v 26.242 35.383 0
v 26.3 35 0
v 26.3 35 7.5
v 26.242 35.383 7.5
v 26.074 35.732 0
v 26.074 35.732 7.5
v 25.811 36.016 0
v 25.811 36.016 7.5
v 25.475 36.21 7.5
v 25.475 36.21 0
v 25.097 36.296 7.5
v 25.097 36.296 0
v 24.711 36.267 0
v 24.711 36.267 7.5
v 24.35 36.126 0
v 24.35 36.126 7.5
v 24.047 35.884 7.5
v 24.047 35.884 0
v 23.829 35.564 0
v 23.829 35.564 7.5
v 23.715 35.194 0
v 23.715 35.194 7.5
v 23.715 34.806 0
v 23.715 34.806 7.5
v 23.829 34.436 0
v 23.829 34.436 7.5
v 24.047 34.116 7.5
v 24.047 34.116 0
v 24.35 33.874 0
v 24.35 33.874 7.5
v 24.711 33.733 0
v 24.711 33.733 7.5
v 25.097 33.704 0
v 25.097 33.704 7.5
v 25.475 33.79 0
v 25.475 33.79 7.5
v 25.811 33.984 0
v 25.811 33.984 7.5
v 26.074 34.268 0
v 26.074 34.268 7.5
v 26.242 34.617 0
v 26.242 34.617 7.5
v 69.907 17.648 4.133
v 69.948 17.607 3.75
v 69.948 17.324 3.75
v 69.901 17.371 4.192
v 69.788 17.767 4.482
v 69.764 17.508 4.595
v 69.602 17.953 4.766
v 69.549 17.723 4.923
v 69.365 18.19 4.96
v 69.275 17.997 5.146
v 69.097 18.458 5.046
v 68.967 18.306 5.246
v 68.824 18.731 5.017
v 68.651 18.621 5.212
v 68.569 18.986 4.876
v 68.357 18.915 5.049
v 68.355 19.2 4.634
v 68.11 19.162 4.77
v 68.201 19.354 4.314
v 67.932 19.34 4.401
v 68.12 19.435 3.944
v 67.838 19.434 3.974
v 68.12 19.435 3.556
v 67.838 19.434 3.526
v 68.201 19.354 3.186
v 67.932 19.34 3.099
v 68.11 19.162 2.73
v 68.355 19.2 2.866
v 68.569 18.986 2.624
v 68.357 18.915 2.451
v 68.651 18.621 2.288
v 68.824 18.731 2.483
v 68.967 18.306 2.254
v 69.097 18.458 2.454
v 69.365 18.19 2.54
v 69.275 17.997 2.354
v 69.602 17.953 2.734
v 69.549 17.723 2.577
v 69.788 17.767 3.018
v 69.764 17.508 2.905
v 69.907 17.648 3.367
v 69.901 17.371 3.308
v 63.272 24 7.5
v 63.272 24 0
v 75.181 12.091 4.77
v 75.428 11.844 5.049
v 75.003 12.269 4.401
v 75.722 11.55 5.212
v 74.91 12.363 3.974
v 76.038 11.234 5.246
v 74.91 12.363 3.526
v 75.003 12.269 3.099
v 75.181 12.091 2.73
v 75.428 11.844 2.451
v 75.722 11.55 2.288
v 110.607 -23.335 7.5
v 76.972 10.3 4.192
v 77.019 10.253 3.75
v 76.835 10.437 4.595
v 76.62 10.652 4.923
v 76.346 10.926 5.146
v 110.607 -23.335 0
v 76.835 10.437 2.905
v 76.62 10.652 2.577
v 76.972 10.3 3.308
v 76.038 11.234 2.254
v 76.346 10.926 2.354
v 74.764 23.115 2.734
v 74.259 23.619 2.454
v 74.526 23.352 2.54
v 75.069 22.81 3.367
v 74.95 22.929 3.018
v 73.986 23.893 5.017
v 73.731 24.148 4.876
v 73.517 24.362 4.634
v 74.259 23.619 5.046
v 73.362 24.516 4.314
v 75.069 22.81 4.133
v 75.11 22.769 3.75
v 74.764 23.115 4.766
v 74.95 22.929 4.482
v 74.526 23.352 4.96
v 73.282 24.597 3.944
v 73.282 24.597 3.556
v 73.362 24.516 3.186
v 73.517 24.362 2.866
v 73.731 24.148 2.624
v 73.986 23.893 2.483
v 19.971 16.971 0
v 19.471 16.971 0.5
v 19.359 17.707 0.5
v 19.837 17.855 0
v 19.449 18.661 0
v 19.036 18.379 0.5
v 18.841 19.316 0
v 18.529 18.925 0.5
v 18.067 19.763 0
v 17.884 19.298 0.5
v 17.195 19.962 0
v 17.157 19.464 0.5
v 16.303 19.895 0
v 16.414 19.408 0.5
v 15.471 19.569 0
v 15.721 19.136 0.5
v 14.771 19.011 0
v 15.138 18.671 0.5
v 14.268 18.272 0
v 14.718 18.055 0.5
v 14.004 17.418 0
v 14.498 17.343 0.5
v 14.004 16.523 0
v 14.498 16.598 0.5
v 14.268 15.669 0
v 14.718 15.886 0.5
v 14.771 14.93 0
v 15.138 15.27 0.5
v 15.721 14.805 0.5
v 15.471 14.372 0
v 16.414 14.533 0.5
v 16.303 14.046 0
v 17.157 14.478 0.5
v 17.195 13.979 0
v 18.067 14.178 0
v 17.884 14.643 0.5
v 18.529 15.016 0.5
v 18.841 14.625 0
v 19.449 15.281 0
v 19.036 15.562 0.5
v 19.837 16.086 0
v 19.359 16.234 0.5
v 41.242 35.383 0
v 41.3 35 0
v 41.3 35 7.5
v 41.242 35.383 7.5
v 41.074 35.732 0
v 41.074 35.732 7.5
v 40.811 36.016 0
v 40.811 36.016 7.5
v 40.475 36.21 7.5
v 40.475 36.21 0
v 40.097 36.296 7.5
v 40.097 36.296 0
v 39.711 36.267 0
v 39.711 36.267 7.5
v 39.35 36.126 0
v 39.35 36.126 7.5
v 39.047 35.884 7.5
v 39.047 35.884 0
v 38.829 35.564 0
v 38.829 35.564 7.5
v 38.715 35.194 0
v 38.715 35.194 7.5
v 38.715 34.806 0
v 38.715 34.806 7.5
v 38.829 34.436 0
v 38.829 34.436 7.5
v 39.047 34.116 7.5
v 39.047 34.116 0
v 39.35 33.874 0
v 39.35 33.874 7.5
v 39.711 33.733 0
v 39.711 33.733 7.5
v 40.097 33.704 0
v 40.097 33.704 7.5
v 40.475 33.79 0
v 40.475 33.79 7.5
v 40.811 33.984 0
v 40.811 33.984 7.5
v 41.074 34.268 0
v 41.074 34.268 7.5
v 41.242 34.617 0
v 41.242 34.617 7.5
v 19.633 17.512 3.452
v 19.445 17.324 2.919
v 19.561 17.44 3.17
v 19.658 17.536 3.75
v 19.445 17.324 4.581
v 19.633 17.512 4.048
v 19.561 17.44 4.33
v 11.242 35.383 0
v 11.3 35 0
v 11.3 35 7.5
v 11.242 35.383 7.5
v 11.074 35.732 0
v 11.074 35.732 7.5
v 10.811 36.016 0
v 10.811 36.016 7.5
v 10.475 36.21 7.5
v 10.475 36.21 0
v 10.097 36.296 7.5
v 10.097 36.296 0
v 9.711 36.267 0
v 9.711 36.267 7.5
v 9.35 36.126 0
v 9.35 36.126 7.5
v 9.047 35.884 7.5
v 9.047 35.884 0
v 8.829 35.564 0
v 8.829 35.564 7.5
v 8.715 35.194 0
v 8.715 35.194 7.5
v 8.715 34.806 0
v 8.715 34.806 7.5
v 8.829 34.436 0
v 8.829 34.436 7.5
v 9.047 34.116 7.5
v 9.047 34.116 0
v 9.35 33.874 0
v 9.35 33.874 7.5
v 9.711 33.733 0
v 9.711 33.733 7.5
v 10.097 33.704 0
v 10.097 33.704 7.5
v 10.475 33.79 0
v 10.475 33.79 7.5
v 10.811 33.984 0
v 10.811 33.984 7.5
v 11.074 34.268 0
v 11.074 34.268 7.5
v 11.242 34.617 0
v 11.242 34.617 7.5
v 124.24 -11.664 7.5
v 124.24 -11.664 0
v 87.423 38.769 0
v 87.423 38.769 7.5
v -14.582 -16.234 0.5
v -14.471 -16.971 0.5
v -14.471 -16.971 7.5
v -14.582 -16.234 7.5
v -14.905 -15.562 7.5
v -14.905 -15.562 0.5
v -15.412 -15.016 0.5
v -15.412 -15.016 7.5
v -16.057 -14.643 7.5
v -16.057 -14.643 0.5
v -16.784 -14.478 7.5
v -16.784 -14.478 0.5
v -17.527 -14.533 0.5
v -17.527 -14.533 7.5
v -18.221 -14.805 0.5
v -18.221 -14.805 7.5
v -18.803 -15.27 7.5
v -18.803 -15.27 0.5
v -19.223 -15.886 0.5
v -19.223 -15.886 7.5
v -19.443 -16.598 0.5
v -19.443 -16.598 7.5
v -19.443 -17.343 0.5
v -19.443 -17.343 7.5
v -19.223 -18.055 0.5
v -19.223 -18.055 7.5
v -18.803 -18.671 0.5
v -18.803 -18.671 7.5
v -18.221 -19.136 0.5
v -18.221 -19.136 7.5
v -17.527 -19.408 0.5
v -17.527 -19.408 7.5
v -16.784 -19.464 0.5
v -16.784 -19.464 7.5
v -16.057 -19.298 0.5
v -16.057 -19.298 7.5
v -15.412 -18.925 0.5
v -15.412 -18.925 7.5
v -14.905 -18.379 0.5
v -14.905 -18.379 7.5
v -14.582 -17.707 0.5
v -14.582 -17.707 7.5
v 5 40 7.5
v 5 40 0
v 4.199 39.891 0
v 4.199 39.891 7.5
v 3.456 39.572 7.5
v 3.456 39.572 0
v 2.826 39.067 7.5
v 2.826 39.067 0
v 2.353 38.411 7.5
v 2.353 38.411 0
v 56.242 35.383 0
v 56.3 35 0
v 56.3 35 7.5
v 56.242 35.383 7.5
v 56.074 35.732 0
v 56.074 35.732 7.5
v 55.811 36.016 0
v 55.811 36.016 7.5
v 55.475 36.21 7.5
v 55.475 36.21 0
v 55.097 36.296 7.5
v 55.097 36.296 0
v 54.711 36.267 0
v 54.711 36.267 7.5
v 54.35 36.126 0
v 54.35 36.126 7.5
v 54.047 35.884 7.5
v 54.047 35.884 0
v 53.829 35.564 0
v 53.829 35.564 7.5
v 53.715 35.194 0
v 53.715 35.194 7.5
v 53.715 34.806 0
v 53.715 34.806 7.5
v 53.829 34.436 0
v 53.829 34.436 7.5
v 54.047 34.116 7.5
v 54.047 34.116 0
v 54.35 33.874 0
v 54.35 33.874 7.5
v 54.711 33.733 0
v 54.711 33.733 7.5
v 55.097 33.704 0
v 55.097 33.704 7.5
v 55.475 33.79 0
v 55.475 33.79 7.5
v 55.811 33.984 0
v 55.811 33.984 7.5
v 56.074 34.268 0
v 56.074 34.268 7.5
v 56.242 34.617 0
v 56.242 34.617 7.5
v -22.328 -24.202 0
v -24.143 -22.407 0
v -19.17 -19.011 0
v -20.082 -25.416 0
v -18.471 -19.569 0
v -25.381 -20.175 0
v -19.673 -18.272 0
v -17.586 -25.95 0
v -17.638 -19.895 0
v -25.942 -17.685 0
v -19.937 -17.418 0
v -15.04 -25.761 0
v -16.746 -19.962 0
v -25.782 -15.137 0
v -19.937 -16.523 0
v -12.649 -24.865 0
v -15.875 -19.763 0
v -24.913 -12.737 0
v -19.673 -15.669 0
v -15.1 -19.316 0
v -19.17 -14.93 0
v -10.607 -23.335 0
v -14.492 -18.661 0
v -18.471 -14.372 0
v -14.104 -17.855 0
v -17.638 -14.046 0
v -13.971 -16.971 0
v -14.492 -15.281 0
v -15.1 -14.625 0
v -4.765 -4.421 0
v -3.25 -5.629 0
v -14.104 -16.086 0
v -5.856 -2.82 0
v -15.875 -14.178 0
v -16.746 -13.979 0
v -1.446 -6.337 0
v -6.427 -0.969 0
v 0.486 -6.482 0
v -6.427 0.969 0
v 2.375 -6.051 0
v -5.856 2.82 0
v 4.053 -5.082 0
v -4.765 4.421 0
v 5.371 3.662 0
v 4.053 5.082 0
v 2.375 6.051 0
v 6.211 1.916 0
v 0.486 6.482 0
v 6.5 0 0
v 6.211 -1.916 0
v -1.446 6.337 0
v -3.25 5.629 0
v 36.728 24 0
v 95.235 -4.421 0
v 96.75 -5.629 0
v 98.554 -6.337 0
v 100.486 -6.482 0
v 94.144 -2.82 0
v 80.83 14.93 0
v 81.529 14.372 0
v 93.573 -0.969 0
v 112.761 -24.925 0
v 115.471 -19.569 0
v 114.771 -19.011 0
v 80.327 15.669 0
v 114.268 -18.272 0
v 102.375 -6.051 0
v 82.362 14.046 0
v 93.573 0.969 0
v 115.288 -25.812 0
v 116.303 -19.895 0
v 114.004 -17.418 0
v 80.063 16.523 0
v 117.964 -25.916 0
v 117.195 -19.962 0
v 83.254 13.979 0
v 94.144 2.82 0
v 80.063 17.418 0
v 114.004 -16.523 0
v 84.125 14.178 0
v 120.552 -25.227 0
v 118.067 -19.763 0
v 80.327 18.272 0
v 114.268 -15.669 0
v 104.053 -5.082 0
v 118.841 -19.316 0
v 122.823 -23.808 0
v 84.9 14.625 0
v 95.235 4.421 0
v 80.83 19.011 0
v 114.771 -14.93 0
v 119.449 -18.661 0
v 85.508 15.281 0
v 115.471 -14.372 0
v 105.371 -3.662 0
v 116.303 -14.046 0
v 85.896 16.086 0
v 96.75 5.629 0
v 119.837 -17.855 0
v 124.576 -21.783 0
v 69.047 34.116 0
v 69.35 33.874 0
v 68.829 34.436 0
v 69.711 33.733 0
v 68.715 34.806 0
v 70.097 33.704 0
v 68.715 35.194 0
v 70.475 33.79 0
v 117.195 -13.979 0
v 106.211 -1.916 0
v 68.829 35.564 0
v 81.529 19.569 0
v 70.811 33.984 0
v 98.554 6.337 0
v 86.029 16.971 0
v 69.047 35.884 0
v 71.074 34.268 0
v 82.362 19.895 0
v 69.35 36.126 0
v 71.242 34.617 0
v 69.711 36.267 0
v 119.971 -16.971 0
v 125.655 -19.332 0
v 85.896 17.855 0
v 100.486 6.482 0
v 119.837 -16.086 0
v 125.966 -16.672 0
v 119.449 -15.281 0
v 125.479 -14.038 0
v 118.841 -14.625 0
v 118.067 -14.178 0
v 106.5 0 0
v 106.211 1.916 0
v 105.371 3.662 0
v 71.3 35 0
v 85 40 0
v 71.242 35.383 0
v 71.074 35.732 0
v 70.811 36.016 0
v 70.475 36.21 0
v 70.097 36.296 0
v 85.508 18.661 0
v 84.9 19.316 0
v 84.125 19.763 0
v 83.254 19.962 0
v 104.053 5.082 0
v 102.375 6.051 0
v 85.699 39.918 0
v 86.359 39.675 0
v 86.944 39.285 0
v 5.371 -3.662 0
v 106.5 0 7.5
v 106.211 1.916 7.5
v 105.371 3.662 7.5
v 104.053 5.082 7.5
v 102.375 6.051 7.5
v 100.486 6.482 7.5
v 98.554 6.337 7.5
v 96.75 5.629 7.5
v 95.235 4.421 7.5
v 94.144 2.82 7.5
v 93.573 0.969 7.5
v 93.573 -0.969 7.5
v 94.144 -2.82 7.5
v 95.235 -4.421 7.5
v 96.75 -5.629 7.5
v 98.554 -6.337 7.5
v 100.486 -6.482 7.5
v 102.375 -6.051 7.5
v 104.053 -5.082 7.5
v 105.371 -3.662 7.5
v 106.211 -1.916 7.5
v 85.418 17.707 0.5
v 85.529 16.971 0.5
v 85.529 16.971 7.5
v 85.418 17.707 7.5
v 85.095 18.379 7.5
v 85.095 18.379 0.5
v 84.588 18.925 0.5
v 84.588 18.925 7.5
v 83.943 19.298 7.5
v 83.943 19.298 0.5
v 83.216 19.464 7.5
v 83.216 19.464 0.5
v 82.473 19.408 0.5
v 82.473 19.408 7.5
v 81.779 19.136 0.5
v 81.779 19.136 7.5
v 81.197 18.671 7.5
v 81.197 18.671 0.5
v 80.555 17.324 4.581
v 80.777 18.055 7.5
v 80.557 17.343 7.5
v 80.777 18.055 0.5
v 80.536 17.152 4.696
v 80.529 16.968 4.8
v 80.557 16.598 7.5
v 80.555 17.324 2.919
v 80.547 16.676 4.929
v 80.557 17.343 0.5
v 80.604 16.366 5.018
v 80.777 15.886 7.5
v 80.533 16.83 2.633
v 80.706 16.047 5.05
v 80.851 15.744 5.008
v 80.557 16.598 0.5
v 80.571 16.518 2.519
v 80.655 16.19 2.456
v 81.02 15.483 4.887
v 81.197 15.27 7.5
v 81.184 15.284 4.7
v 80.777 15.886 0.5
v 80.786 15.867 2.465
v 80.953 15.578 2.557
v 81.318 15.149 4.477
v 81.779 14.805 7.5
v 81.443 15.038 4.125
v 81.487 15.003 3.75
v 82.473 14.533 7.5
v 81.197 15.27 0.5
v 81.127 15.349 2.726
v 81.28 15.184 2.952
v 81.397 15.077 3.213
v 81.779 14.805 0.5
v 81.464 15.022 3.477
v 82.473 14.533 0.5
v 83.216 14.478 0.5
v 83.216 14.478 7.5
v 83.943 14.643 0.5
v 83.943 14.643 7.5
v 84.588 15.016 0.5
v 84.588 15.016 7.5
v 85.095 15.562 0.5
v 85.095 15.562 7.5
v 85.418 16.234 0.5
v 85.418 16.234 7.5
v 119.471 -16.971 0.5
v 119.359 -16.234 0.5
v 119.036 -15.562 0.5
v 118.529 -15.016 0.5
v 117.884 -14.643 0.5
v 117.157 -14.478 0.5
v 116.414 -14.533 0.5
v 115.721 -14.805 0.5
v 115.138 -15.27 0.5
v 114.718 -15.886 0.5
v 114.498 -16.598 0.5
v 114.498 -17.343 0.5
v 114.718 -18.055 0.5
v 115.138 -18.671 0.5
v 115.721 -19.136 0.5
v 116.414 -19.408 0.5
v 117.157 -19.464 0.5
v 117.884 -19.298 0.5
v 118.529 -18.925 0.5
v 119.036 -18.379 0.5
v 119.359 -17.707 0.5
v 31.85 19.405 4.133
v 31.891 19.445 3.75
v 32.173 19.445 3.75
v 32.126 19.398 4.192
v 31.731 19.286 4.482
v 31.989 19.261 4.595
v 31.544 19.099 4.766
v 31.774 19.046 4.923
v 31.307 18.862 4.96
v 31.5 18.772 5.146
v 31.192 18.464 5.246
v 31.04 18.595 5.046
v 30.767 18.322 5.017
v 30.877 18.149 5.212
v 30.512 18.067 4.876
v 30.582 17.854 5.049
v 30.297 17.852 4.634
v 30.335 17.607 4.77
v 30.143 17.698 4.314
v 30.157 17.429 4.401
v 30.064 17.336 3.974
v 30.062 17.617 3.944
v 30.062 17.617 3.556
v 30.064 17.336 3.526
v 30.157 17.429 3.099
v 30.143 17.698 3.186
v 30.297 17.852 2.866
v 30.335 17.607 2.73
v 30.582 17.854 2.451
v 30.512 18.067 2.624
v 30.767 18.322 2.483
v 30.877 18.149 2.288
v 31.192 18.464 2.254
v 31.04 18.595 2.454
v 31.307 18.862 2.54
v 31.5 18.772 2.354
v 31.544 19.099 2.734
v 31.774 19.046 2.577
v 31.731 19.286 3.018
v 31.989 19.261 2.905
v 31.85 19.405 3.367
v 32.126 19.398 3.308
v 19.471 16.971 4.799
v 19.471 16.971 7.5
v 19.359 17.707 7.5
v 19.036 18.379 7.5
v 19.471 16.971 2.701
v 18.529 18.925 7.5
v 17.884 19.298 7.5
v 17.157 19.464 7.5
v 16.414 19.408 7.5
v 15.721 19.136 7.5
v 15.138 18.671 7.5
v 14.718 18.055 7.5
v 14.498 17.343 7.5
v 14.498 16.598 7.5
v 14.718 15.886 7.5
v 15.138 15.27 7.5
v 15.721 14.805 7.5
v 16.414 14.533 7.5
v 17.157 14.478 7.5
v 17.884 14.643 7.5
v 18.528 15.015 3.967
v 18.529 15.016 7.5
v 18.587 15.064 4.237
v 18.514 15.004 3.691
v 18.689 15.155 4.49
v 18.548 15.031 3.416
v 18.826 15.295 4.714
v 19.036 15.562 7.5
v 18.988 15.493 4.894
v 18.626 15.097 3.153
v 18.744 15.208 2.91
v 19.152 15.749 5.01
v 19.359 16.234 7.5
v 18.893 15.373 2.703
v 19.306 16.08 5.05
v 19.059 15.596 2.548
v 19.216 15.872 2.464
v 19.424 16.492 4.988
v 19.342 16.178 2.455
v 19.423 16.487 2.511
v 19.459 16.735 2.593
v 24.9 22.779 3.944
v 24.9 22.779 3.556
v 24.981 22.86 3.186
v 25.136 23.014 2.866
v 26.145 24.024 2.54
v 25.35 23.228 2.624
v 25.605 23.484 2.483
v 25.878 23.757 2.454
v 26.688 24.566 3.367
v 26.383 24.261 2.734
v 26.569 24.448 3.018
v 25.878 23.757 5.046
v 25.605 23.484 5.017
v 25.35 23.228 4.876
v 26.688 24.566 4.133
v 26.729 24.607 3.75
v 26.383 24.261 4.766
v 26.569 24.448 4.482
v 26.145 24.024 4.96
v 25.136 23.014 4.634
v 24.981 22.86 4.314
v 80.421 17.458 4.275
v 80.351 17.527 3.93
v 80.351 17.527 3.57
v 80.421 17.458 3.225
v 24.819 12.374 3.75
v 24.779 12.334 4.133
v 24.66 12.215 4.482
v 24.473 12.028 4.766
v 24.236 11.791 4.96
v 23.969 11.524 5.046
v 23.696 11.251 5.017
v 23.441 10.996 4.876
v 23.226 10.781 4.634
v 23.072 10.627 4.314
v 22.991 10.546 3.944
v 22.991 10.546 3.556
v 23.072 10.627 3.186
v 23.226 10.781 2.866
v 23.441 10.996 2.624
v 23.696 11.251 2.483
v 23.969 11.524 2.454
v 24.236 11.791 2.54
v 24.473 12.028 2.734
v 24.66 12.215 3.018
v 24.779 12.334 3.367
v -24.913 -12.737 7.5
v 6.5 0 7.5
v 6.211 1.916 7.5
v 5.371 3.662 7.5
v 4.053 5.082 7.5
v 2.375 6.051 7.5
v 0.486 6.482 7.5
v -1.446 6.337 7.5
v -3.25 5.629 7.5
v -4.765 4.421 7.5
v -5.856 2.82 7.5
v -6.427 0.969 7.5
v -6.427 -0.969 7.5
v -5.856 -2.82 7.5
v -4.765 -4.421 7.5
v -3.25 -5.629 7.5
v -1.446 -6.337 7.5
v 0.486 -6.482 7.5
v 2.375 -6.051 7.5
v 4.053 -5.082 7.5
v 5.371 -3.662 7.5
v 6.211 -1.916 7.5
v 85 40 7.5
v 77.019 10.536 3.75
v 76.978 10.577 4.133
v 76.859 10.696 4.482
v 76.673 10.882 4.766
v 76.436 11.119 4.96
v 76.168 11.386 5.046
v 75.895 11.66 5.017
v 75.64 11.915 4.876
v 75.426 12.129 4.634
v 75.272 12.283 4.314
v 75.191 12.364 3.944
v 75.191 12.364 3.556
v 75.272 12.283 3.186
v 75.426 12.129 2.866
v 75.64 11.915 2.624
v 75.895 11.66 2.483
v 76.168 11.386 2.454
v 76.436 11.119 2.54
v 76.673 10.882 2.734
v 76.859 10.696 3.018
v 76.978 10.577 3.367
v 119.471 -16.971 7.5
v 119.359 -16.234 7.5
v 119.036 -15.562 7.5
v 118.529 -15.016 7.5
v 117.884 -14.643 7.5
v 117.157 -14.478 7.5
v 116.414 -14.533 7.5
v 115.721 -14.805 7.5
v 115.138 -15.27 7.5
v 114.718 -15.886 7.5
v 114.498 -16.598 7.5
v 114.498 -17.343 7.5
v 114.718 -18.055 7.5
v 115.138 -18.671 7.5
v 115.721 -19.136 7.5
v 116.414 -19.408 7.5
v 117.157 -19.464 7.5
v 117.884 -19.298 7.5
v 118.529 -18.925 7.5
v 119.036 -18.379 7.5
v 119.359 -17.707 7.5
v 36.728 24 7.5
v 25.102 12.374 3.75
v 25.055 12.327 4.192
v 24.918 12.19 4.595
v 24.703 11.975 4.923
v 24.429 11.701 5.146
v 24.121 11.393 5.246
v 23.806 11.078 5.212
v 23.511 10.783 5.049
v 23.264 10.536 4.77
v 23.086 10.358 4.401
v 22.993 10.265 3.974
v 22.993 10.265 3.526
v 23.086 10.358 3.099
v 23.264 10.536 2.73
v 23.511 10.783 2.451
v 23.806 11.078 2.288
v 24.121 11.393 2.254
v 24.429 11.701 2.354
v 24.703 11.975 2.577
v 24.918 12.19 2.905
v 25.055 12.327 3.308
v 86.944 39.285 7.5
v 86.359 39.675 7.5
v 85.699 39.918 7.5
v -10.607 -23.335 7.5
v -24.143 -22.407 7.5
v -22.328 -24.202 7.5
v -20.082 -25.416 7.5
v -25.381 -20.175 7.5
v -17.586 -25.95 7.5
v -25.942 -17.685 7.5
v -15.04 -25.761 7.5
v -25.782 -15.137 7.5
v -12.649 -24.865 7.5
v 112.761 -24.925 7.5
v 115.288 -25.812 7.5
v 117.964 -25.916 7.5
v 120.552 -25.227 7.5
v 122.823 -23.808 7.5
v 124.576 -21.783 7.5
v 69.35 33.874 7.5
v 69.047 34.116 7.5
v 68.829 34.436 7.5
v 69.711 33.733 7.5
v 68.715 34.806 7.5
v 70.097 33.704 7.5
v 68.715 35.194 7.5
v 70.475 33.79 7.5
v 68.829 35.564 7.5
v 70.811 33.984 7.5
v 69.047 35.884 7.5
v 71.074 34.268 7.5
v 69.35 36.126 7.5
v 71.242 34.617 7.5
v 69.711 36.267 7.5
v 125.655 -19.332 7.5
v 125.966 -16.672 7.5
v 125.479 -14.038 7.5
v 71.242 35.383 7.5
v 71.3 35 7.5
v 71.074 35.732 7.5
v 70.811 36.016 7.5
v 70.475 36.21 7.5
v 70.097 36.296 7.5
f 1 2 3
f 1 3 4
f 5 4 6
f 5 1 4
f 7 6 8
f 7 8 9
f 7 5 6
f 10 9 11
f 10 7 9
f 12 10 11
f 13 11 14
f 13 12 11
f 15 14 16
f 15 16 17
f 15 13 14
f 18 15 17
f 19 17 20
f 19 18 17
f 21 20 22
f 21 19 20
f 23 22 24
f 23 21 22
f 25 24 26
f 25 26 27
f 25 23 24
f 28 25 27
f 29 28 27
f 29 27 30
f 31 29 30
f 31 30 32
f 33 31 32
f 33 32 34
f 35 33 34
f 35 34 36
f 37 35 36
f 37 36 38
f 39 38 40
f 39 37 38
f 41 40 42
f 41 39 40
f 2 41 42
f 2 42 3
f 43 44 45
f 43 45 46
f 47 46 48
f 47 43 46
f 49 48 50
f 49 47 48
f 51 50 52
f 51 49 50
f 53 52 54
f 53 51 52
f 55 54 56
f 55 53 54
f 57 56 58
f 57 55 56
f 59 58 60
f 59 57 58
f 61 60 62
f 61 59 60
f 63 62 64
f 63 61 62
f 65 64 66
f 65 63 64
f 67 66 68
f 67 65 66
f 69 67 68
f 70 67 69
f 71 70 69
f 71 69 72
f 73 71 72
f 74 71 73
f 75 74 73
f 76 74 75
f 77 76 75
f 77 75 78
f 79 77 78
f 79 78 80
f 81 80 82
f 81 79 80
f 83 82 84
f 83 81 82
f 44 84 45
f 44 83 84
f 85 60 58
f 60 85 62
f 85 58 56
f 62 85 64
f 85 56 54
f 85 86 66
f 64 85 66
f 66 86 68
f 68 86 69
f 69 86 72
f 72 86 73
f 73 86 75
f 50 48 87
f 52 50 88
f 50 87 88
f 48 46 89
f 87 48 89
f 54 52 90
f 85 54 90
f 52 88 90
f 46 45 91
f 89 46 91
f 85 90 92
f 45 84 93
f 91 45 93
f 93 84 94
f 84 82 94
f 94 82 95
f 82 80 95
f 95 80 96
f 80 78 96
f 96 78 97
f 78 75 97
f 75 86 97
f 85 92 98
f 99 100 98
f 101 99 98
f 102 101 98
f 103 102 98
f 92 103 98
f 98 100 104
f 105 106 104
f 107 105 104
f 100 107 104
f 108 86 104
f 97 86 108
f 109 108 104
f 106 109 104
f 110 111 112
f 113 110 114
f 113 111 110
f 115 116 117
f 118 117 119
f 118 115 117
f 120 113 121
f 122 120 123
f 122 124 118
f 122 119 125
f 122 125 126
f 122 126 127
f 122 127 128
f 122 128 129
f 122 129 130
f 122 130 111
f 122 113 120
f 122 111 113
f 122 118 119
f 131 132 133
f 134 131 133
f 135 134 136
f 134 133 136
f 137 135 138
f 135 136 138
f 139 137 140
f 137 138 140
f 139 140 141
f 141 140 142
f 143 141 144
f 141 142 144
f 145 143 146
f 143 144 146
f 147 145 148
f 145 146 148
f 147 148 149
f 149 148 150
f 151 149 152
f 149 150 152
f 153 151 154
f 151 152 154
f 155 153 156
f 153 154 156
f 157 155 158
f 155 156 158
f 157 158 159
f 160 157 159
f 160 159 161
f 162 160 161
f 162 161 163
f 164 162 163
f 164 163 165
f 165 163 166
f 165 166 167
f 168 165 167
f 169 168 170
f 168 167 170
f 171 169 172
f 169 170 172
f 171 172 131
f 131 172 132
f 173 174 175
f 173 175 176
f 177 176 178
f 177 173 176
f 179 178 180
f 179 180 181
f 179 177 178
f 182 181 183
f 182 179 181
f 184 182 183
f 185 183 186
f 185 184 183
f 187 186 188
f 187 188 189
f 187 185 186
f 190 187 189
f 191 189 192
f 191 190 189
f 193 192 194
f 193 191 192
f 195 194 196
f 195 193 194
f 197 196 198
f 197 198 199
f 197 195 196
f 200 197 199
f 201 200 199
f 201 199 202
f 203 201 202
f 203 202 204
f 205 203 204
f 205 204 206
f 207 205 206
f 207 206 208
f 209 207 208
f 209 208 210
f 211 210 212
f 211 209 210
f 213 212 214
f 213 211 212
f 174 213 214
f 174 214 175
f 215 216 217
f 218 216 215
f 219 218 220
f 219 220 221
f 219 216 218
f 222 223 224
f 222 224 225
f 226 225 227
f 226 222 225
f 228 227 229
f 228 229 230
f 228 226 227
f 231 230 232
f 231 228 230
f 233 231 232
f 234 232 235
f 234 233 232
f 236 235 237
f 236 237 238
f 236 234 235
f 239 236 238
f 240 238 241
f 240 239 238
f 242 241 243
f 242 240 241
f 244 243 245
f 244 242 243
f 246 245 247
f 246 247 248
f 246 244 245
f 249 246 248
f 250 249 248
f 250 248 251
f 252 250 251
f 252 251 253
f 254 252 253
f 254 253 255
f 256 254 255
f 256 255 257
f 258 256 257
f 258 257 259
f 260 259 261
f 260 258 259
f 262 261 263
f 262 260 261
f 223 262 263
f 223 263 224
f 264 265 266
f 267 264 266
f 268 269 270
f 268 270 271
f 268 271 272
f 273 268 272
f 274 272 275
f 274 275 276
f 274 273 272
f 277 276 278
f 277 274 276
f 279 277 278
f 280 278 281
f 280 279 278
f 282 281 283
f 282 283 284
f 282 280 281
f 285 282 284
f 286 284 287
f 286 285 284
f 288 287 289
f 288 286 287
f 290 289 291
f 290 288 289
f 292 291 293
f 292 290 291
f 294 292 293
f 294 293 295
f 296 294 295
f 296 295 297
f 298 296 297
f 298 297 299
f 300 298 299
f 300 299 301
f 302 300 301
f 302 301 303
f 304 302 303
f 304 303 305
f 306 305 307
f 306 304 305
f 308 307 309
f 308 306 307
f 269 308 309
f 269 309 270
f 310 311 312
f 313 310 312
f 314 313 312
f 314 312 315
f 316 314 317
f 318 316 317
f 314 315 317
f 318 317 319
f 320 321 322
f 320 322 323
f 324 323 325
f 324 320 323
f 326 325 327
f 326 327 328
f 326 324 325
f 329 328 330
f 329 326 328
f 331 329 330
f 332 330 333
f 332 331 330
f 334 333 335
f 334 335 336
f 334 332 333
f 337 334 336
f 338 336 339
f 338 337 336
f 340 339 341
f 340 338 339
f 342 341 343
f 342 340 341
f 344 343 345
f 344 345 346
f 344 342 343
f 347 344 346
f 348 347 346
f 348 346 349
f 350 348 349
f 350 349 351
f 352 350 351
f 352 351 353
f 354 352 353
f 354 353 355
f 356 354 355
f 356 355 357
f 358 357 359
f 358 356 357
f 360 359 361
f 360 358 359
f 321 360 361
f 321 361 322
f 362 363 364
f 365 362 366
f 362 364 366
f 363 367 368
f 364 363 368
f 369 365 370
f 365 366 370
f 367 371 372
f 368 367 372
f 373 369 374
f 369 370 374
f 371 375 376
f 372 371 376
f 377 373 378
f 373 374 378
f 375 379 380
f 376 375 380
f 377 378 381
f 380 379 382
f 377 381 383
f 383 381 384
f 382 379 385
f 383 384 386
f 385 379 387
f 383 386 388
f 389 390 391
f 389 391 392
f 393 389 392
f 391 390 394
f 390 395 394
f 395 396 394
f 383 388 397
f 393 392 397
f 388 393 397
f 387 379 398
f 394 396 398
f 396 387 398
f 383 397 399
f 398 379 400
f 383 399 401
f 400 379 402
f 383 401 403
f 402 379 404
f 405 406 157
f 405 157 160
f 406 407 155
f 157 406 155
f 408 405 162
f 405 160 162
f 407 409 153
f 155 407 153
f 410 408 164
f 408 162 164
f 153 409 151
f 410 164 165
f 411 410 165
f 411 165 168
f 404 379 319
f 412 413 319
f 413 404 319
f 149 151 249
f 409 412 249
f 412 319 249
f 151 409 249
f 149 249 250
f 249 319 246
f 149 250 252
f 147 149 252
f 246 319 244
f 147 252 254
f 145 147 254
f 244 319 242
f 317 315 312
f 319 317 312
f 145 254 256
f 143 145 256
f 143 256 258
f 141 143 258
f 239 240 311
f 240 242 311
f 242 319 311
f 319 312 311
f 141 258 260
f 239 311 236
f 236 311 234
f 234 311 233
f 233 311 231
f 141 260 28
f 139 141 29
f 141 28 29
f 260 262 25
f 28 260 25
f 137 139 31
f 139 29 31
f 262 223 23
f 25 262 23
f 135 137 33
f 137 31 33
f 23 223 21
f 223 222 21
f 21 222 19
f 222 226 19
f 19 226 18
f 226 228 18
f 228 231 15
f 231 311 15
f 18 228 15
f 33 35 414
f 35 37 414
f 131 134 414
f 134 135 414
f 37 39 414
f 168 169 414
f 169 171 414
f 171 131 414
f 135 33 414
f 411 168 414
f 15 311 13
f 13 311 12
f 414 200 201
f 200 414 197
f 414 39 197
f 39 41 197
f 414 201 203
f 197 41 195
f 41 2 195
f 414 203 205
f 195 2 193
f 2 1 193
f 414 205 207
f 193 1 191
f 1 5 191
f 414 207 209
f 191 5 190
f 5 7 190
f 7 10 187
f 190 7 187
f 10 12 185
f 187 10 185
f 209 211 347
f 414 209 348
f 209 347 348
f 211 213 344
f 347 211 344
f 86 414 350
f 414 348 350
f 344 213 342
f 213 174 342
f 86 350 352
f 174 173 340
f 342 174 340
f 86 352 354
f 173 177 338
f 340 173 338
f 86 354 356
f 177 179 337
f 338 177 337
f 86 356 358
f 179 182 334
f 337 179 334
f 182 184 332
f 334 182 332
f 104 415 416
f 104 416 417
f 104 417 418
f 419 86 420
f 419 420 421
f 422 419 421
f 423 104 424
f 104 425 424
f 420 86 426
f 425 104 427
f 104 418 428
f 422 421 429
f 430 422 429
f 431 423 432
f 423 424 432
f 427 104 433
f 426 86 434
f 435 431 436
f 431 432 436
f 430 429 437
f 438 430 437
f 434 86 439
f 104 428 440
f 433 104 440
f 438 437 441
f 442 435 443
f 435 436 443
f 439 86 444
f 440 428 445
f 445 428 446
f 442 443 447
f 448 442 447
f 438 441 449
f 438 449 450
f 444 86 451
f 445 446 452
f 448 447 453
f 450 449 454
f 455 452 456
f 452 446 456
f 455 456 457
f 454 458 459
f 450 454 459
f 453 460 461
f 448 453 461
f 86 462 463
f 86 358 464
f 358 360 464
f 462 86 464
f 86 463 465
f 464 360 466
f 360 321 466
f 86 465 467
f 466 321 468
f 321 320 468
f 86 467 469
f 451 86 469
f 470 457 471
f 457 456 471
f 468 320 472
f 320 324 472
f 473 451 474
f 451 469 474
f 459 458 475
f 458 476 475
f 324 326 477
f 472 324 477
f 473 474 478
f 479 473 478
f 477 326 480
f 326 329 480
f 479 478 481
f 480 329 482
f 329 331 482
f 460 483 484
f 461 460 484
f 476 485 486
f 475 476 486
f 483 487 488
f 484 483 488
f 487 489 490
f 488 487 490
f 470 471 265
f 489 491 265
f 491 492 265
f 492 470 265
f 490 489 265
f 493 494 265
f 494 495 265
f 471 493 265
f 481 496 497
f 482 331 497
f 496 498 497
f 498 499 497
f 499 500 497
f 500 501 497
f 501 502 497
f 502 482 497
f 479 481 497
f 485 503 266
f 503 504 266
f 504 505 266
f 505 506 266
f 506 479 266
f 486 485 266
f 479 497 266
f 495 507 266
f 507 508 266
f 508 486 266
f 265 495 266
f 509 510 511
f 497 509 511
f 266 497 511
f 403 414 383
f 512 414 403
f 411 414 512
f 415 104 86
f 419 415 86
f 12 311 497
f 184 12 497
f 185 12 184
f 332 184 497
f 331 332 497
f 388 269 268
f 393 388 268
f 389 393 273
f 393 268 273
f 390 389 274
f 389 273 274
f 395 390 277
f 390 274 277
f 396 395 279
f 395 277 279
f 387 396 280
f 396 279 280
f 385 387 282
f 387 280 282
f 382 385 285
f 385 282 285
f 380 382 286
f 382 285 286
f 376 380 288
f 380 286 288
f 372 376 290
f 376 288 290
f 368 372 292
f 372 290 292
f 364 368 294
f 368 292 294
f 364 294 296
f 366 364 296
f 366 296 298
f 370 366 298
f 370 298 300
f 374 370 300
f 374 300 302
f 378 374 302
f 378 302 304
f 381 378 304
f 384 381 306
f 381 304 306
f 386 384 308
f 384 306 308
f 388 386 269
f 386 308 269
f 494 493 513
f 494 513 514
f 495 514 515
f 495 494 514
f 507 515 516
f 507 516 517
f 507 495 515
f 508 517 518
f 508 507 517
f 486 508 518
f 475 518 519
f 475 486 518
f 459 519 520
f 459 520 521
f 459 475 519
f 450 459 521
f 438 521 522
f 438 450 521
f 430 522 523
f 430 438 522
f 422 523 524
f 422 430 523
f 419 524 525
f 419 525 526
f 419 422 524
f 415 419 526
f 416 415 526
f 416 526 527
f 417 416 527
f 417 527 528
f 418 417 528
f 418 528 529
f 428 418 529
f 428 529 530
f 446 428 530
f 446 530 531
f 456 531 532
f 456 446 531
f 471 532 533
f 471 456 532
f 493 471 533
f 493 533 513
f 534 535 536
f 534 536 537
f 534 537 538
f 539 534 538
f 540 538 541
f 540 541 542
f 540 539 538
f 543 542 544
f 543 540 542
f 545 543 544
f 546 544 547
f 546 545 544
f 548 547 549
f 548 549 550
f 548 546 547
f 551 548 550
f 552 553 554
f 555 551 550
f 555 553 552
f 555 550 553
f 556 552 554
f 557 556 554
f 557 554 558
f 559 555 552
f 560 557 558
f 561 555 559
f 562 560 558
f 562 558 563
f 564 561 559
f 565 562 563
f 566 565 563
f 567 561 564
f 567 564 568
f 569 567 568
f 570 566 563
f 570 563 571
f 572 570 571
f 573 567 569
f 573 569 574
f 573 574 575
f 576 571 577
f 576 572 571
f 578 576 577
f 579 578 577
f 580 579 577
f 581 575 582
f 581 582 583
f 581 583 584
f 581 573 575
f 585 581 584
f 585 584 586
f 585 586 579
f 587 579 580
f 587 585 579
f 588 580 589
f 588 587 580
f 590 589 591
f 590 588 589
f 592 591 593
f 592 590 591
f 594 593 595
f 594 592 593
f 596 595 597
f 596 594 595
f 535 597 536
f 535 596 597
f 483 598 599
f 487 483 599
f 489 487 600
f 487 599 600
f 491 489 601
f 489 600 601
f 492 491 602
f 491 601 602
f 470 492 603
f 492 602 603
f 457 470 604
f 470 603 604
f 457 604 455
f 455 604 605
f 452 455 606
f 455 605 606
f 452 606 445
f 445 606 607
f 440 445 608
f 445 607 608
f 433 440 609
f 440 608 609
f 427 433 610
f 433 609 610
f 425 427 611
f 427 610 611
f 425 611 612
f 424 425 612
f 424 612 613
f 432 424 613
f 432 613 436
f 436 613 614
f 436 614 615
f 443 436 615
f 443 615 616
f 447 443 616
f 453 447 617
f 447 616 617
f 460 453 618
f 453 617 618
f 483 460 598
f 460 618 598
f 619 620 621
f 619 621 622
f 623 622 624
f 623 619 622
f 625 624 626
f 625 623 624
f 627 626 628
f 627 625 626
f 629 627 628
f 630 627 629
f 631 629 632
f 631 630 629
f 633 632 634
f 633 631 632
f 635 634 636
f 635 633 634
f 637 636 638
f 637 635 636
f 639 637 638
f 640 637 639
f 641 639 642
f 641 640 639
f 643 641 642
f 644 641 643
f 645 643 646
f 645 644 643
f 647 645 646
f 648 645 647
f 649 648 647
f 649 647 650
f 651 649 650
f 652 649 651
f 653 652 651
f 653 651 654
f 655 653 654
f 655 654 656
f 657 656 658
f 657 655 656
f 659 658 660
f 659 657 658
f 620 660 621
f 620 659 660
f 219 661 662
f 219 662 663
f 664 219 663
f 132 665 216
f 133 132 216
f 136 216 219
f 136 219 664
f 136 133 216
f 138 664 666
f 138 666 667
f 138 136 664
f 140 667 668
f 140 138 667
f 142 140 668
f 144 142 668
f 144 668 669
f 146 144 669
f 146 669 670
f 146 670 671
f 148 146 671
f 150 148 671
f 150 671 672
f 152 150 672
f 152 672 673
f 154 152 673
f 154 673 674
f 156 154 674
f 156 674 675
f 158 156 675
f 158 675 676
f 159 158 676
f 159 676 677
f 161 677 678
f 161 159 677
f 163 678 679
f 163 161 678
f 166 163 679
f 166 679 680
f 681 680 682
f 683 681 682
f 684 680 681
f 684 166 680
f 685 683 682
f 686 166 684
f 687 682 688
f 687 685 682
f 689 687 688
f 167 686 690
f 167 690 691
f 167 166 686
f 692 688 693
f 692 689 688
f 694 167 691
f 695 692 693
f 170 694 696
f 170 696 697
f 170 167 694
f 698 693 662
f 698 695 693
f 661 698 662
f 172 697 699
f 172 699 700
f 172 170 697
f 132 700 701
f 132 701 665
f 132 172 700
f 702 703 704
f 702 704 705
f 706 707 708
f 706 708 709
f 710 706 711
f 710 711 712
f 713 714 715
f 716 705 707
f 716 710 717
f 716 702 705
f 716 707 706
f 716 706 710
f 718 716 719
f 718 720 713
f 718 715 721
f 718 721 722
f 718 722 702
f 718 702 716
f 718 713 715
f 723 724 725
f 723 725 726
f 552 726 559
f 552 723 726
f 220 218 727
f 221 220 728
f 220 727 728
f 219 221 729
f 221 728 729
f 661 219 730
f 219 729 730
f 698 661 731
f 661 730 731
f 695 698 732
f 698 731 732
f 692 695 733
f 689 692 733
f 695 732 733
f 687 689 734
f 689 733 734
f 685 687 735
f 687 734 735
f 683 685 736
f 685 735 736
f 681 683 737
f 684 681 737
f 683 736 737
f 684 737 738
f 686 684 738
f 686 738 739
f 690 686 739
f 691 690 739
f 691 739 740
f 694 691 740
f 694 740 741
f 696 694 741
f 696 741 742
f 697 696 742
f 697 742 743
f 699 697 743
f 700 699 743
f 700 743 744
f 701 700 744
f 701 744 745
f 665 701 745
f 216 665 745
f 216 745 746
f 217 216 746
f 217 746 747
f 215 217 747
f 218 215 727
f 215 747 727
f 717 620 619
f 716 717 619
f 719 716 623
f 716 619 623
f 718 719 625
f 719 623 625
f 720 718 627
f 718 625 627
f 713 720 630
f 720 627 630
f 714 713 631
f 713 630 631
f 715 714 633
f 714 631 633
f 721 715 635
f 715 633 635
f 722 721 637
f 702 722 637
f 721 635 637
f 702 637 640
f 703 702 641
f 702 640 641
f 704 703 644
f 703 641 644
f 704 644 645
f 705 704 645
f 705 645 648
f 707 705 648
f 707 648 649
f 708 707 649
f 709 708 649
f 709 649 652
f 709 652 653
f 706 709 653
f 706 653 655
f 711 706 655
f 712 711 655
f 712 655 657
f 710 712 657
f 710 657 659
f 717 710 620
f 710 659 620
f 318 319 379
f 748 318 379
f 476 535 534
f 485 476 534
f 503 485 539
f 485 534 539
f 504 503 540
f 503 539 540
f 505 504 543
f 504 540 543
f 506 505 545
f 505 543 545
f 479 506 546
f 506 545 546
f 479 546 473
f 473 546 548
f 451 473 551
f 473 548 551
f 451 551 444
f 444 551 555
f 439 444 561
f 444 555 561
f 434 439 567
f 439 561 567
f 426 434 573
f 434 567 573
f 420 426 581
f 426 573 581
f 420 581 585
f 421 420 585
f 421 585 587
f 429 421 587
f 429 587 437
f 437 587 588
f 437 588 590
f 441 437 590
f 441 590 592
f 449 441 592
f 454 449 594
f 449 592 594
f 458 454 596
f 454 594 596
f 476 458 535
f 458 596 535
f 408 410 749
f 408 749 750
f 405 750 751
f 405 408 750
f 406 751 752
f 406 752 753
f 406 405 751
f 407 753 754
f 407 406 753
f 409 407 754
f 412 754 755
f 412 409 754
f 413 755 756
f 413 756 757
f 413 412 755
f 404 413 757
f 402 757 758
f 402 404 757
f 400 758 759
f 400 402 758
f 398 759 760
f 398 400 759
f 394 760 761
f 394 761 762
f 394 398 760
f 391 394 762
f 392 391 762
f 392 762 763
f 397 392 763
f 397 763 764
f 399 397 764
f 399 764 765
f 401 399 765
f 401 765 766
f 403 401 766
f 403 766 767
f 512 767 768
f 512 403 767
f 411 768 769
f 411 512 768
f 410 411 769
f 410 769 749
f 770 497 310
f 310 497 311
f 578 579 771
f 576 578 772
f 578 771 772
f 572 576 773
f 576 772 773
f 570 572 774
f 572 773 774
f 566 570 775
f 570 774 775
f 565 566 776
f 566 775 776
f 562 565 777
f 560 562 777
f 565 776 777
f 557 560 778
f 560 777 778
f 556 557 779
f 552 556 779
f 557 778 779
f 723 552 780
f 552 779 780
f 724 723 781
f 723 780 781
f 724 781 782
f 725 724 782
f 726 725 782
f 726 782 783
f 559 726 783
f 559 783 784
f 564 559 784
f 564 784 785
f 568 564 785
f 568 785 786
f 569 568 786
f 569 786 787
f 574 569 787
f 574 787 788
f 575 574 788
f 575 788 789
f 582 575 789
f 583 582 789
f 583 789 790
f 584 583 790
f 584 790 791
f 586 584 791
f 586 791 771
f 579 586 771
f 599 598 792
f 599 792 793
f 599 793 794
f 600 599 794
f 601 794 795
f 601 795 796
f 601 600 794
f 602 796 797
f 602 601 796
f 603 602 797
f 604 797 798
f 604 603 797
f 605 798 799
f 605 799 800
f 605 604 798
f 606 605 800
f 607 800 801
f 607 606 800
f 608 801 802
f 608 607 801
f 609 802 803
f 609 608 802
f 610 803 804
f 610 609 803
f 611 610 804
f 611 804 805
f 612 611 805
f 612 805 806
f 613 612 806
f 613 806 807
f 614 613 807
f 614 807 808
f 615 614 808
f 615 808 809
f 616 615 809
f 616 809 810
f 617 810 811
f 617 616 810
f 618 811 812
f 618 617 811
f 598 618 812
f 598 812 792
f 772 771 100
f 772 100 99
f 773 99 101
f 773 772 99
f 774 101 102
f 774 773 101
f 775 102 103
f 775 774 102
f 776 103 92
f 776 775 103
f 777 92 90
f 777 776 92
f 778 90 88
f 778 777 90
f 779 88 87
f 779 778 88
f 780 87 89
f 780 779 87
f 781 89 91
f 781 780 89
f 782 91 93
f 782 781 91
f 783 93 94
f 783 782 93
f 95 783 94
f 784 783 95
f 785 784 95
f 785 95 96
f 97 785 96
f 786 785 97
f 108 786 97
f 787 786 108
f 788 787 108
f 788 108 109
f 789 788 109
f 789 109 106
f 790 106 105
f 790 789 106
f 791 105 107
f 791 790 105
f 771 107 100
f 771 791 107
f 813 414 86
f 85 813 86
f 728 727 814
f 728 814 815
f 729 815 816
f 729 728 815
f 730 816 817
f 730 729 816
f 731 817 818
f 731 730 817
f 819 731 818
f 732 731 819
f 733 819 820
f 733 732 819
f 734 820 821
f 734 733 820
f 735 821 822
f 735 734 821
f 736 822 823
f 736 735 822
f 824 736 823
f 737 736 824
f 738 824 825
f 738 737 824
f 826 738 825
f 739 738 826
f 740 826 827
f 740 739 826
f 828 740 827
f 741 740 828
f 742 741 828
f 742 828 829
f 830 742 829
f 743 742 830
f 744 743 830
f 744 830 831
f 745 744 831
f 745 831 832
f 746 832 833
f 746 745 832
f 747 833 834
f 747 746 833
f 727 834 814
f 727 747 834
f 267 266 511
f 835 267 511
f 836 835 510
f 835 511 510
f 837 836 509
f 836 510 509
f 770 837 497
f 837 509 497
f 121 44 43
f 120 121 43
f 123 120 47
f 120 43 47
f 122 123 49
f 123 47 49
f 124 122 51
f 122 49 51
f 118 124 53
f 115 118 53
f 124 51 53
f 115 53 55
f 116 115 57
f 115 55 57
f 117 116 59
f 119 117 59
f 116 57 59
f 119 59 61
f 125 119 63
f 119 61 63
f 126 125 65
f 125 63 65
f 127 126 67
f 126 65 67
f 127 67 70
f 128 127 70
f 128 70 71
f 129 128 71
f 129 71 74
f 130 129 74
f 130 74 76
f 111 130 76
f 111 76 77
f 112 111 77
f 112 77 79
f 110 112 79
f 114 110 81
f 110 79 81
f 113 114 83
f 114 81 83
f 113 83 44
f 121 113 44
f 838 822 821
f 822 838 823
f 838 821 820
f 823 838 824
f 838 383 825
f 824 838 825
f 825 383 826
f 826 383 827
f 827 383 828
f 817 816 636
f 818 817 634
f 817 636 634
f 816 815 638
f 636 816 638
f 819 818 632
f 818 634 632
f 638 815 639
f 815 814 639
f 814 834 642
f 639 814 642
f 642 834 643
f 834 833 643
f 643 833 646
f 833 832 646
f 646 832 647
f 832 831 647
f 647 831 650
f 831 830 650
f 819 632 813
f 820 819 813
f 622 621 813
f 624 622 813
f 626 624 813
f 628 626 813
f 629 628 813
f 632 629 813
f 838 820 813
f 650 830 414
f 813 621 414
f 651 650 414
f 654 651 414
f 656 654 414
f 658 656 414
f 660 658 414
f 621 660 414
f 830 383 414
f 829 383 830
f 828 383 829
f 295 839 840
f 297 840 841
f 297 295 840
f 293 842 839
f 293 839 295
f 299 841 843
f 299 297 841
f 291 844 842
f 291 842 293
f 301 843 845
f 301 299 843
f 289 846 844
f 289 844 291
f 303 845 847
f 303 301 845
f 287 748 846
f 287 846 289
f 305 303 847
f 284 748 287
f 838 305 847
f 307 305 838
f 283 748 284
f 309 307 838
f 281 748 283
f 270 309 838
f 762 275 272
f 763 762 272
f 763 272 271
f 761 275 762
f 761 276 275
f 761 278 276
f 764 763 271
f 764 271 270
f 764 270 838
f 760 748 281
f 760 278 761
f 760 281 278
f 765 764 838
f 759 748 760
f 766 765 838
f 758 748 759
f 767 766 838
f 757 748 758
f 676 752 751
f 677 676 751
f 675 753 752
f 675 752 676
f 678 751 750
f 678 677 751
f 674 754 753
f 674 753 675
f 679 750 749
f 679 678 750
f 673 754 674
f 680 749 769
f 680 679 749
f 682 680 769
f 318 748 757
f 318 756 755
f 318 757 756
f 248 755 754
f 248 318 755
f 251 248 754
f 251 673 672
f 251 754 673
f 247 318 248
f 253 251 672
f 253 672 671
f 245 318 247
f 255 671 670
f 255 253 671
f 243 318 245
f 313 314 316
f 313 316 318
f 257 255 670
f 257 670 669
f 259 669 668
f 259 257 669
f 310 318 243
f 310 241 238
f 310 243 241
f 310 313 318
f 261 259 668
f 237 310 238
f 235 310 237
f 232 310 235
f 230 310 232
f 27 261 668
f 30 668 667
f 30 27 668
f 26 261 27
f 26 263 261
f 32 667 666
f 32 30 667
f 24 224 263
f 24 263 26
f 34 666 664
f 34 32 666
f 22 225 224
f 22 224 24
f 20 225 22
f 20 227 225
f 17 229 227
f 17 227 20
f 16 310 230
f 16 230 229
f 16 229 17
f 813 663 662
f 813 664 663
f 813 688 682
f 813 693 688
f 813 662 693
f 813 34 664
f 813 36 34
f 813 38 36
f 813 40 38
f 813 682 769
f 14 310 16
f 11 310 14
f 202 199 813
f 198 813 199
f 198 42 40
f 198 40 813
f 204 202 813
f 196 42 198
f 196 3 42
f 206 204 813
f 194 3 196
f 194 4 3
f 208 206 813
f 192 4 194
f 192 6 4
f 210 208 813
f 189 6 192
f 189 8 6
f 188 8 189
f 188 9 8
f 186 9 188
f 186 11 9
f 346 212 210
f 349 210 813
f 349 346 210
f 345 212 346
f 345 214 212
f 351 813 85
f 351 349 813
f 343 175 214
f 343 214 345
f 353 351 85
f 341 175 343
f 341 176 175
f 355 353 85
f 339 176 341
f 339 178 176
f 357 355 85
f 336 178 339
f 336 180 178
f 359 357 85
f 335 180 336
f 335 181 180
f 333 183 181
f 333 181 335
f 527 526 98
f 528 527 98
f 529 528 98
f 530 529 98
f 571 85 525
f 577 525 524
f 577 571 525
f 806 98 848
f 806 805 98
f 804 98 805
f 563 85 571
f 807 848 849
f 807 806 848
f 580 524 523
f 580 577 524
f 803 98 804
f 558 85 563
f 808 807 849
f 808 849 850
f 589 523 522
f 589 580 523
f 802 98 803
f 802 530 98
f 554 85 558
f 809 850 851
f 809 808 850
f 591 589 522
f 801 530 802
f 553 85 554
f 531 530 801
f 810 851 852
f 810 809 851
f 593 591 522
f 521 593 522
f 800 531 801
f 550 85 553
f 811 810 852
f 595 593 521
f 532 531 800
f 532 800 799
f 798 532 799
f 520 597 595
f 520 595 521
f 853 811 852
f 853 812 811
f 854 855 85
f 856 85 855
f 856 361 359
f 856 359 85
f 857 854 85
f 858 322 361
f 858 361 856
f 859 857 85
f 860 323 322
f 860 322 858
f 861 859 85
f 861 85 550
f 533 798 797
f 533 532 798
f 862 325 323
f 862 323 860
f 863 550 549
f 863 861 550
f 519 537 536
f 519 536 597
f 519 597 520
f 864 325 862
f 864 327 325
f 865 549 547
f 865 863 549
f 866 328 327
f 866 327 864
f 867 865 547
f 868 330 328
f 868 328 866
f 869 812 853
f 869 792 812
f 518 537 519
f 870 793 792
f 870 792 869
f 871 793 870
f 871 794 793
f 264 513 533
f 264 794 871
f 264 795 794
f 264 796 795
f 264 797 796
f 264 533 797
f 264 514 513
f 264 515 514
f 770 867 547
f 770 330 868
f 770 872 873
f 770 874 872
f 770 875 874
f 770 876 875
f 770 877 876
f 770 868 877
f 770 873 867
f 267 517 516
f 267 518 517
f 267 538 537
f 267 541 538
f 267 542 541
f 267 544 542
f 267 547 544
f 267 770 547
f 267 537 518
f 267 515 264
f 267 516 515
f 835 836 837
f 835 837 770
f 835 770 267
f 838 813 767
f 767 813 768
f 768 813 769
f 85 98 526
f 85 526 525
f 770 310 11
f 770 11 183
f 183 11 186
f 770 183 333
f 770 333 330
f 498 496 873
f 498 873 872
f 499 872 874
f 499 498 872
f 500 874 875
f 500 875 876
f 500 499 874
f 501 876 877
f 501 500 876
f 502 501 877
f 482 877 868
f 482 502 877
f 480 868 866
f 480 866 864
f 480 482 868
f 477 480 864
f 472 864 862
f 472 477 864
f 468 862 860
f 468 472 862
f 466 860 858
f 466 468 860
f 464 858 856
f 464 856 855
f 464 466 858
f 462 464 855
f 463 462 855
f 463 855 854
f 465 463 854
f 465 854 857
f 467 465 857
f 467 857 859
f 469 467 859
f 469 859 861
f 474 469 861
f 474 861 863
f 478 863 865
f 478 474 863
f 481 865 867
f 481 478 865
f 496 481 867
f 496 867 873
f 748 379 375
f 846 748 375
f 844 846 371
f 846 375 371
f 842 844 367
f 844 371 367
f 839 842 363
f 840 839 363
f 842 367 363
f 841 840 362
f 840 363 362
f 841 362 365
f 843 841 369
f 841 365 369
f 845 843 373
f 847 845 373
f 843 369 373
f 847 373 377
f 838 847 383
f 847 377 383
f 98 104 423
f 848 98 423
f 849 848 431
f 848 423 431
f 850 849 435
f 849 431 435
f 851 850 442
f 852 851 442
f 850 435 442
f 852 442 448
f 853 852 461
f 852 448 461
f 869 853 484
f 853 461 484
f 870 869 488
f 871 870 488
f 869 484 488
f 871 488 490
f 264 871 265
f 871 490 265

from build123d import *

# Parameters (mm, degrees)
SKETCH_2_R          = 6.5
SKETCH_2_R_2        = 1.3
SKETCH_2_R_3        = 2.5
EXTRUDE_1_DEPTH     = 7.5
SKETCH_10_R         = 1.3
CUT_EXTRUDE_2_DEPTH = 7.5
SKETCH_4_R          = 1.3
CUT_EXTRUDE_4_DEPTH = 7.5
CHAMFER_2_SIZE      = 0.2
CHAMFER_3_SIZE      = 0.2
CHAMFER_4_SIZE      = 0.5


with BuildPart() as part:
    # 草圖2 → 填料-伸長1 (new body)
    with BuildSketch(Plane.XY):
        with BuildLine():
            Line((40, 40), (5, 40))
            ThreePointArc((5, 40), (3.456243754, 39.57231737), (2.352645995, 38.411211101))
            Line((2.352645995, 38.411211101), (-24.912624764, -12.736929445))
            ThreePointArc((-24.912624764, -12.736929445), (-22.327787039, -24.202446867), (-10.606601718, -23.334523779))
            Line((-10.606601718, -23.334523779), (36.727922061, 24))
            Line((36.727922061, 24), (63.272077939, 24))
            Line((63.272077939, 24), (110.606601718, -23.334523779))
            ThreePointArc((110.606601718, -23.334523779), (122.823351862, -23.807584), (124.239699521, -11.663996007))
            Line((124.239699521, -11.663996007), (87.423045591, 38.768855581))
            ThreePointArc((87.423045591, 38.768855581), (86.358939524, 39.674562276), (85, 40))
            Line((85, 40), (40, 40))
        make_face()
        Circle(SKETCH_2_R, mode=Mode.SUBTRACT)
        with Locations((100, 0)):
            Circle(SKETCH_2_R, mode=Mode.SUBTRACT)
        with Locations((25, 35)):
            Circle(SKETCH_2_R_2, mode=Mode.SUBTRACT)
        with Locations((70, 35)):
            Circle(SKETCH_2_R_2, mode=Mode.SUBTRACT)
        with Locations((40, 35)):
            Circle(SKETCH_2_R_2, mode=Mode.SUBTRACT)
        with Locations((55, 35)):
            Circle(SKETCH_2_R_2, mode=Mode.SUBTRACT)
        with Locations((10, 35)):
            Circle(SKETCH_2_R_2, mode=Mode.SUBTRACT)
        with Locations((16.970562748, 16.970562748)):
            Circle(SKETCH_2_R_3, mode=Mode.SUBTRACT)
        with Locations((83.029437252, 16.970562748)):
            Circle(SKETCH_2_R_3, mode=Mode.SUBTRACT)
        with Locations((-16.970562748, -16.970562748)):
            Circle(SKETCH_2_R_3, mode=Mode.SUBTRACT)
        with Locations((116.970562748, -16.970562748)):
            Circle(SKETCH_2_R_3, mode=Mode.SUBTRACT)
    extrude(amount=EXTRUDE_1_DEPTH)

    # 草圖10 → 除料-伸長2 (cut)
    with BuildSketch(Plane(origin=(43.636038969, 43.636038969, 0), x_dir=(-0.70710678118655, 0.7071067811865451, 0), z_dir=(-0.7071067811865451, -0.70710678118655, 0))):
        with Locations(Location((-45.710678119, -3.75, 0), (0, 0, 180))):
            Circle(SKETCH_10_R)
        with Locations(Location((-35.710678119, -3.75, 0), (0, 0, 180))):
            Circle(SKETCH_10_R)
    extrude(amount=-CUT_EXTRUDE_2_DEPTH, mode=Mode.SUBTRACT)

    # 草圖4 → 除料-伸長4 (cut)
    with BuildSketch(Plane(origin=(6.363961031, -6.363961031, 0), x_dir=(-0.7071067811865464, -0.7071067811865488, 0), z_dir=(0.7071067811865488, -0.7071067811865464, 0))):
        with Locations(Location((-25, -3.75, 0), (0, 0, 180))):
            Circle(SKETCH_4_R)
        with Locations(Location((-35, -3.75, 0), (0, 0, 180))):
            Circle(SKETCH_4_R)
    extrude(amount=-CUT_EXTRUDE_4_DEPTH, mode=Mode.SUBTRACT)

    # 導角2
    chamfer_2_edges = [part.edges().sort_by_distance(p)[0] for p in [
        (67.968062812, 19.304015126, 3.75),
        (75.039130624, 12.232947315, 3.75),
    ]]
    chamfer(chamfer_2_edges, length=CHAMFER_2_SIZE)

    # 導角3
    chamfer_3_edges = [part.edges().sort_by_distance(p)[0] for p in [
        (23.122391745, 10.394469683, 3.75),
        (30.193459557, 17.465537495, 3.75),
    ]]
    chamfer(chamfer_3_edges, length=CHAMFER_3_SIZE)

    # 導角4
    chamfer_4_edges = [part.edges().sort_by_distance(p)[0] for p in [
        (14.470562748, 16.970562748, 0),
        (80.529437252, 16.970562748, 0),
        (114.470562748, -16.970562748, 0),
        (-19.470562748, -16.970562748, 0),
    ]]
    chamfer(chamfer_4_edges, length=CHAMFER_4_SIZE)


solid = part.part
